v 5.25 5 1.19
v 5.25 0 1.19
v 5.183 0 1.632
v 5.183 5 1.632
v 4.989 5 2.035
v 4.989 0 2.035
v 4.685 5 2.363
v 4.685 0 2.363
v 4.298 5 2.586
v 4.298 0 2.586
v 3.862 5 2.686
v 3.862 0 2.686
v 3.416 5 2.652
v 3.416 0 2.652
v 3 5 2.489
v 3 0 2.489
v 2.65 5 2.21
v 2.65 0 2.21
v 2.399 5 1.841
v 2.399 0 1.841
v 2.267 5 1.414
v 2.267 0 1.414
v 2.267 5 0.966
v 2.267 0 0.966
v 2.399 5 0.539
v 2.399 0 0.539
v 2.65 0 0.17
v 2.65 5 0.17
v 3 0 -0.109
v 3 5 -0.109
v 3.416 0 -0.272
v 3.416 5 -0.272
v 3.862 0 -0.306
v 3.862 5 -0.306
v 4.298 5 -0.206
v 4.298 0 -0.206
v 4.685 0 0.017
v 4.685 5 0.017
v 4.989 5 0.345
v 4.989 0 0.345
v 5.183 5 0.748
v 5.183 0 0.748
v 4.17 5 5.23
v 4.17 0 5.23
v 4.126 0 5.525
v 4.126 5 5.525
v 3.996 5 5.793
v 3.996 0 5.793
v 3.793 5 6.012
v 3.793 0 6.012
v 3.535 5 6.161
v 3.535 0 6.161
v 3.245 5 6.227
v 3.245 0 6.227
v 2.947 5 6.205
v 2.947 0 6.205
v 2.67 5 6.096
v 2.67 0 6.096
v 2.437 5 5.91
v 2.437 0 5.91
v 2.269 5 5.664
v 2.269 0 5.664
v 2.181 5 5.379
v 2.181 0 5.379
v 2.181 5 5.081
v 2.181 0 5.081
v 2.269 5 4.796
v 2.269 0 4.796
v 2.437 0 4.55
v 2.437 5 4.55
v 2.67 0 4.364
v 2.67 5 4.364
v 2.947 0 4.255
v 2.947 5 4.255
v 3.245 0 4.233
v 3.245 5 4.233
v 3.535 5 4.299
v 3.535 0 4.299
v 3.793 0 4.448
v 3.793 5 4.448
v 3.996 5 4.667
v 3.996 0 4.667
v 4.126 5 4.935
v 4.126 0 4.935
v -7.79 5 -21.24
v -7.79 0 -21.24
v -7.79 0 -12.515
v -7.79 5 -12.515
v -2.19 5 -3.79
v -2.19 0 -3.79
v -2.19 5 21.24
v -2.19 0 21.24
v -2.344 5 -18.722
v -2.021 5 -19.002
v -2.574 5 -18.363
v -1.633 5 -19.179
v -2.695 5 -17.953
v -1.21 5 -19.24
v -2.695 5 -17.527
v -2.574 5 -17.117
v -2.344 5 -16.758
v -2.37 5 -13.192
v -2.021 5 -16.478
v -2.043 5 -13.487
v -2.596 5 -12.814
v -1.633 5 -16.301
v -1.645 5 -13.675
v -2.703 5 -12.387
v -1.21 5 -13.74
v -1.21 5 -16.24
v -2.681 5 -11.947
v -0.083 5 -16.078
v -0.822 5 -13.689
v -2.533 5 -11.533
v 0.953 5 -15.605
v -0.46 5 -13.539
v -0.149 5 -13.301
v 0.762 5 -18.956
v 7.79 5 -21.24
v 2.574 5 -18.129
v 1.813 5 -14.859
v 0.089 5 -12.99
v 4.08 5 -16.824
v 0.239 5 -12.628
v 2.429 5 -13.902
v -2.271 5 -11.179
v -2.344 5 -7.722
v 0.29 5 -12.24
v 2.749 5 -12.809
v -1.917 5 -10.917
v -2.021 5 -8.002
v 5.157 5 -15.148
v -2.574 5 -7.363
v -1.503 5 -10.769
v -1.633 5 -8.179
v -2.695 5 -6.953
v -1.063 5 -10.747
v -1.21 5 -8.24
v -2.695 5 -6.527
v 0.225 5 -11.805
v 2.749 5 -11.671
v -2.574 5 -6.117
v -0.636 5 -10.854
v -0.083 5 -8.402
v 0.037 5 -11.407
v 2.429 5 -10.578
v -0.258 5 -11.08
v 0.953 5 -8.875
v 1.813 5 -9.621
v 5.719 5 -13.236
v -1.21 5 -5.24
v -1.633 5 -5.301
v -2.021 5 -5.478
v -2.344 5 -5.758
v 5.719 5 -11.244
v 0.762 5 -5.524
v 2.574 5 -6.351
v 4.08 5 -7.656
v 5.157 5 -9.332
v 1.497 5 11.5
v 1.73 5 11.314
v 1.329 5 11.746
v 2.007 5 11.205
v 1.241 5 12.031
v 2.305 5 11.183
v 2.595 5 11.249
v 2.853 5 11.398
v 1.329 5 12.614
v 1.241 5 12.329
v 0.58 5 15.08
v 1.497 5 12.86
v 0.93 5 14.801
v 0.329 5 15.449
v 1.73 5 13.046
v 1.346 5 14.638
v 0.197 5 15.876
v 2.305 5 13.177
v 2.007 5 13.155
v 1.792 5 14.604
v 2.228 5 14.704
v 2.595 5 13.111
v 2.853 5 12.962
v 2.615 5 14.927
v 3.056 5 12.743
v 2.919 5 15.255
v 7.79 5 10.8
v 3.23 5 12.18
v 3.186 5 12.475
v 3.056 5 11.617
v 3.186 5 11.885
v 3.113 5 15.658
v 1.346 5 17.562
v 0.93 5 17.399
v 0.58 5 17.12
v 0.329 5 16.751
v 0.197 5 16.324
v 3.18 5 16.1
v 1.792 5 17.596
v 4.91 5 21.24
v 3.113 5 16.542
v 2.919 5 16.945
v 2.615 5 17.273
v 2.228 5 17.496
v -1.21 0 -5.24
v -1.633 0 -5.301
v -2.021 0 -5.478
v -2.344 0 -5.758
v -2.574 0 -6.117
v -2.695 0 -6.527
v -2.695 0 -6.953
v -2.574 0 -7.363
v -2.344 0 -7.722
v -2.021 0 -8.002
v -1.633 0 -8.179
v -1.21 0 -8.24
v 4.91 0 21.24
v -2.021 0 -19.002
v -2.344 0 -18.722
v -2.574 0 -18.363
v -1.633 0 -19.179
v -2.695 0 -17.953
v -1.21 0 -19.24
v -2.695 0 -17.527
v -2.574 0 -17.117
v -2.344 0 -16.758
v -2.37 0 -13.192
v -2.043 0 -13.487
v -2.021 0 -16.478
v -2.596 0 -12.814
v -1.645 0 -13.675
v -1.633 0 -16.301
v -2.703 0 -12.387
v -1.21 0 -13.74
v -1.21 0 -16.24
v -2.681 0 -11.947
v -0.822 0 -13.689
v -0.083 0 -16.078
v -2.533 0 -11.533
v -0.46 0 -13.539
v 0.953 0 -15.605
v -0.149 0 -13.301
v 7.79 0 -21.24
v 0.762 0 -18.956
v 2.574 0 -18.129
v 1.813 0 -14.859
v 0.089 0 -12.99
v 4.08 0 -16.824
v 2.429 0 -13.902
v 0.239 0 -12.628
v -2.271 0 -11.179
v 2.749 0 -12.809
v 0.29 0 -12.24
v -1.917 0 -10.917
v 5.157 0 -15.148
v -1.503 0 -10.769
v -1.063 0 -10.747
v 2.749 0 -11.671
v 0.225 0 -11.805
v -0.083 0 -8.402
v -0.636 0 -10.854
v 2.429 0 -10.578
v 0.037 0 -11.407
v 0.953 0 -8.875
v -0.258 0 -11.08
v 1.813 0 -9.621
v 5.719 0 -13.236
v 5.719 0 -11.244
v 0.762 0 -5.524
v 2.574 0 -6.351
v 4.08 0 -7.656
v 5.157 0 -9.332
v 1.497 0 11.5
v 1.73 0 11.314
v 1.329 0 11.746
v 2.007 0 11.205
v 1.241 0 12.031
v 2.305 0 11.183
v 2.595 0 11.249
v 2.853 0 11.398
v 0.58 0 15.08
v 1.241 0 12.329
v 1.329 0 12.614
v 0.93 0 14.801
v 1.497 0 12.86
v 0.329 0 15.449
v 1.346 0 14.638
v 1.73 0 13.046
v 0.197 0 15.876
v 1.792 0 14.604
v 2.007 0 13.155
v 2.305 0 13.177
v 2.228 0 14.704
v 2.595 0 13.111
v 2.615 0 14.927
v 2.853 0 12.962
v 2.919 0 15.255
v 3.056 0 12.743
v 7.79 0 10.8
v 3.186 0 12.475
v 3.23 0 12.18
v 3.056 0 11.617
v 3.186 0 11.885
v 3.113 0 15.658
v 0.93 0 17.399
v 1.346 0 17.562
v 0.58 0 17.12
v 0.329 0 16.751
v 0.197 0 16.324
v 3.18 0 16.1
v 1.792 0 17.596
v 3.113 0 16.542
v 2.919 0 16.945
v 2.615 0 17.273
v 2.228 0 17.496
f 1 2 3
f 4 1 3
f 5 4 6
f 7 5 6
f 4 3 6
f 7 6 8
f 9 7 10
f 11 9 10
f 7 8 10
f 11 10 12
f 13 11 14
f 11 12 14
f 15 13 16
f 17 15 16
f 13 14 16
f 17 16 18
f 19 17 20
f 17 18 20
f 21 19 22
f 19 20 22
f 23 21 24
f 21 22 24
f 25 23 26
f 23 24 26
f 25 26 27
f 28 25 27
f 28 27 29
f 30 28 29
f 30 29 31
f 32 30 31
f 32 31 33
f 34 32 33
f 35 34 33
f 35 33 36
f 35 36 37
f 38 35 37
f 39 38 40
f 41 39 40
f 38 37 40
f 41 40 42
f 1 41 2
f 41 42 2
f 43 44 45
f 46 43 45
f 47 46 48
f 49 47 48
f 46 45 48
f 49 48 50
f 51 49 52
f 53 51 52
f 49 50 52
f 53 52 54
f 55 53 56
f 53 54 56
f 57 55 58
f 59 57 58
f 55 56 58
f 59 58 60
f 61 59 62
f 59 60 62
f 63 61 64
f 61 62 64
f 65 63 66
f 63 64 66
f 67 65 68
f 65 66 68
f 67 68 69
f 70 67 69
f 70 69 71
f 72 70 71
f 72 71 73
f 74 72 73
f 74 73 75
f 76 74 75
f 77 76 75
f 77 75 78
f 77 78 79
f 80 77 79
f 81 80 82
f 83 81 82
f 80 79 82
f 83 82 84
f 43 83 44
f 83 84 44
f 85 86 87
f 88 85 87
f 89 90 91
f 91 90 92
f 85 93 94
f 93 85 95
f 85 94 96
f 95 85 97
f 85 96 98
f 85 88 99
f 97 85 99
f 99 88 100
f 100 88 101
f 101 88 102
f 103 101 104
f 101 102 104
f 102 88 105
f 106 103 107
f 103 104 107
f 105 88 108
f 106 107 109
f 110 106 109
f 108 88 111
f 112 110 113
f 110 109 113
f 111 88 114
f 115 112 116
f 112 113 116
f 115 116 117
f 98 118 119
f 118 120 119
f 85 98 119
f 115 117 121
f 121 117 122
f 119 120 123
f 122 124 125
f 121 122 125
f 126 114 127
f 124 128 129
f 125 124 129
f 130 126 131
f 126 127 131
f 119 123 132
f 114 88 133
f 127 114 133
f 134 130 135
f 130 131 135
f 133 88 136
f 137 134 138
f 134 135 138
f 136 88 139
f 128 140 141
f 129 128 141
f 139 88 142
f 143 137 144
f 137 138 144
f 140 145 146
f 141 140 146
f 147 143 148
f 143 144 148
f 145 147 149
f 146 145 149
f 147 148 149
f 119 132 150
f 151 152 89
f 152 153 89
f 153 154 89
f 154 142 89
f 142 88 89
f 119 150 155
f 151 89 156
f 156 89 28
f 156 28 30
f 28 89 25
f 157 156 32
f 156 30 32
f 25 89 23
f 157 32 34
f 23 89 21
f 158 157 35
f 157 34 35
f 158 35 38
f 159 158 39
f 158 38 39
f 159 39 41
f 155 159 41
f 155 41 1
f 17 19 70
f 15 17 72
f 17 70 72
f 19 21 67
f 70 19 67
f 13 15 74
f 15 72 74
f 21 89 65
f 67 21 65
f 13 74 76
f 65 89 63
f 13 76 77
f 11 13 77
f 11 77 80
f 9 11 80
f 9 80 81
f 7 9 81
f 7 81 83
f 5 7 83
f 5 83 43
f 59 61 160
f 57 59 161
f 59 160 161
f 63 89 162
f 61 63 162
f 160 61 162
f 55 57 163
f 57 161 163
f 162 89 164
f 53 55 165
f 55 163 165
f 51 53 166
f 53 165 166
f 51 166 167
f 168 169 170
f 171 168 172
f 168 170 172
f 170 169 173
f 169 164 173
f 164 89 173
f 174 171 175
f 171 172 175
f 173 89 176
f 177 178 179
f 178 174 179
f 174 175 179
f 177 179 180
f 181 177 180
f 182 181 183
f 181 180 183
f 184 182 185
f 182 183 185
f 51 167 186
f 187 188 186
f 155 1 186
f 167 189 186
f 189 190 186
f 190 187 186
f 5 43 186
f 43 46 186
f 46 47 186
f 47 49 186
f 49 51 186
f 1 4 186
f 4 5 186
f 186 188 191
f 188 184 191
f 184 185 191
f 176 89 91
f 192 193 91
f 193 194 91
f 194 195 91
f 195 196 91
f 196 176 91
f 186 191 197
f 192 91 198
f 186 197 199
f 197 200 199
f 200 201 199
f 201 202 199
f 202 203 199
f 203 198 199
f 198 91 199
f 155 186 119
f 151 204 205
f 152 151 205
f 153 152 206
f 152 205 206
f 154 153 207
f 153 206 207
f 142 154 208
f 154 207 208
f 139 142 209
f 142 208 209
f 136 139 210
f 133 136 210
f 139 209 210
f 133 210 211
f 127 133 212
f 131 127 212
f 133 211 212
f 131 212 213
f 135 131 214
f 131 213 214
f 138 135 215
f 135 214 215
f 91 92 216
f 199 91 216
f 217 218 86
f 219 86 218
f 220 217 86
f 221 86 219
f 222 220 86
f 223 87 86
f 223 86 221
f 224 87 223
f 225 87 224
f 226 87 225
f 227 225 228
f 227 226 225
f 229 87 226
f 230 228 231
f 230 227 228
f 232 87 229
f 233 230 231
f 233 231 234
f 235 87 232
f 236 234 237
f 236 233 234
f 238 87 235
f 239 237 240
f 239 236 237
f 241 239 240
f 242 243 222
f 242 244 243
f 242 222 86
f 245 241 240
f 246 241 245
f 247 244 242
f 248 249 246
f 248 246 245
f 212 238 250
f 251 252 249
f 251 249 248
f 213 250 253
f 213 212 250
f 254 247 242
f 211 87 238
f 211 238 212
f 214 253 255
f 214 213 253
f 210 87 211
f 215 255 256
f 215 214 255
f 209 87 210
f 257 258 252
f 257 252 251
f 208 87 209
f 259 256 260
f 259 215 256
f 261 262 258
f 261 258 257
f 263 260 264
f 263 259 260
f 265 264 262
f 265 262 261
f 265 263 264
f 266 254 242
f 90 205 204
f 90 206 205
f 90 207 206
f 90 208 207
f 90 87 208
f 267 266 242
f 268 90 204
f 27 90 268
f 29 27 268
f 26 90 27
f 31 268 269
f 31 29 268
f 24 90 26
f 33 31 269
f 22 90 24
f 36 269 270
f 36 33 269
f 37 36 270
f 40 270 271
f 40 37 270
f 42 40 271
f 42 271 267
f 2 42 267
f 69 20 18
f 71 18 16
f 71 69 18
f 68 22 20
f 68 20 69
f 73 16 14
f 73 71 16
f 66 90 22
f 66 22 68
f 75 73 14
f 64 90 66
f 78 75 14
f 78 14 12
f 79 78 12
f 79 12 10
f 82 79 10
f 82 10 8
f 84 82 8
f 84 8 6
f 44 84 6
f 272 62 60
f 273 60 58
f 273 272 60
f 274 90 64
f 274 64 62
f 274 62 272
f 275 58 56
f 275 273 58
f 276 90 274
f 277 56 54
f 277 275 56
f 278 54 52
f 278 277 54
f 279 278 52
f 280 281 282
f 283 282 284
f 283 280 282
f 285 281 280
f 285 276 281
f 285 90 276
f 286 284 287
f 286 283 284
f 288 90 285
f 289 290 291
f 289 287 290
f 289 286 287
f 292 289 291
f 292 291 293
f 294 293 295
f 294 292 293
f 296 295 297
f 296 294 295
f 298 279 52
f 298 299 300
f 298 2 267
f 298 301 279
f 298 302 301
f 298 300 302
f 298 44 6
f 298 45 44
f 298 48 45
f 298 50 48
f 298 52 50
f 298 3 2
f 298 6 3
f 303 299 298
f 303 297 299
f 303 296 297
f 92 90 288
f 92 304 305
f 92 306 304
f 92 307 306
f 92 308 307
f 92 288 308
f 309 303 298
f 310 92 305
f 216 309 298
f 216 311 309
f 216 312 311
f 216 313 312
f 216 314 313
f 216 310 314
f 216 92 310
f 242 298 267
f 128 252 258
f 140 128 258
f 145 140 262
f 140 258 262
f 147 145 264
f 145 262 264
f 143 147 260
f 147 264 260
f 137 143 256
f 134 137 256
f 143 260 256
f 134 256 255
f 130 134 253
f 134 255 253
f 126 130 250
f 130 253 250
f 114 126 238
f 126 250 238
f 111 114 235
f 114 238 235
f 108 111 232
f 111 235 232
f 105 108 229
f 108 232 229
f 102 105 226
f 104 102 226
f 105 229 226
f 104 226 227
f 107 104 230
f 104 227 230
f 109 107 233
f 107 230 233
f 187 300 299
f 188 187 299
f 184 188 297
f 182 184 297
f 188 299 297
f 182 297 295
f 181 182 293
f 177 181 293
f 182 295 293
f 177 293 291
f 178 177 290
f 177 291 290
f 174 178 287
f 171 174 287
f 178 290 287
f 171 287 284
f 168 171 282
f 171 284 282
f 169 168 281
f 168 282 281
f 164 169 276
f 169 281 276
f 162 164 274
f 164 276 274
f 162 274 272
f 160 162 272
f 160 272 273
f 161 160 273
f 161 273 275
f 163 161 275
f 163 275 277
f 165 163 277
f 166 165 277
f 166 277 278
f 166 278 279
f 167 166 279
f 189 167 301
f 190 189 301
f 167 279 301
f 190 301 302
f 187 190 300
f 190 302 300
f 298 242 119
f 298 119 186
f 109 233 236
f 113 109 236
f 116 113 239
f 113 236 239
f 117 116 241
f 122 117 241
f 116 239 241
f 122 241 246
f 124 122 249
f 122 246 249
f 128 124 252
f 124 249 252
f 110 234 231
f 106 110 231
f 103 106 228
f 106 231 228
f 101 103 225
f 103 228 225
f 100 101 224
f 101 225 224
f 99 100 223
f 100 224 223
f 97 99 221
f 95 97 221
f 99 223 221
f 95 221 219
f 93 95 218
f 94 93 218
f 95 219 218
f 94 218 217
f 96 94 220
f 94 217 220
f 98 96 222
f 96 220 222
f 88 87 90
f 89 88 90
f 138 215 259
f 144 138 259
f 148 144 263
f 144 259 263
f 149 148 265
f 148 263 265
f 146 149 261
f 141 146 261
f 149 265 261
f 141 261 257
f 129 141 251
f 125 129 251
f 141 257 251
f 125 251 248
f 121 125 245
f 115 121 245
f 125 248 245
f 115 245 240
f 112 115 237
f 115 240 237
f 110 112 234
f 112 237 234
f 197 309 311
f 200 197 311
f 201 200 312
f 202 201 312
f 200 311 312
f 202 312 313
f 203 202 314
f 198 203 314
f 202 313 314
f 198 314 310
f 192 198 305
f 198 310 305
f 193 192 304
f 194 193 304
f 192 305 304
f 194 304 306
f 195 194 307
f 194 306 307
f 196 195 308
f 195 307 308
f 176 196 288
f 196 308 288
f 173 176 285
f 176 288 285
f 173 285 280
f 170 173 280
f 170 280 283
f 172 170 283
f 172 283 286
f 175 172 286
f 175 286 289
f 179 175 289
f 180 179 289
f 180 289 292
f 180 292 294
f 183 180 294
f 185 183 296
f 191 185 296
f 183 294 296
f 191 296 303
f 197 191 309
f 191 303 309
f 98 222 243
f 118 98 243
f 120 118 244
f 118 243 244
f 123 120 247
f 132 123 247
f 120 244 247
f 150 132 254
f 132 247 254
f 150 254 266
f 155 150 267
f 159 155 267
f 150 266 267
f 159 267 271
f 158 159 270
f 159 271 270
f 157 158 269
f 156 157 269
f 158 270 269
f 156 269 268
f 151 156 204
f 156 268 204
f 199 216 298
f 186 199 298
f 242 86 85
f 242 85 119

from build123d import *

# Parameters (mm, degrees)
F0_W     = 15.58
F0_H     = 42.48
F1_DEPTH = 5
F3_DEPTH = 5
F5_DEPTH = 5
F6_R     = 1.5
F6_R_2   = 1
F7_DEPTH = 5
F9_DEPTH = 5


with BuildPart() as f1:
    # F0 (on Front) → F1 (new body)
    with BuildSketch(Plane.XZ):
        Rectangle(F0_W, F0_H)
    extrude(amount=-F1_DEPTH)

    # F2 (on face) → F3 (cut, through all)
    with BuildSketch(Plane.XZ):
        Polygon((4.91, 21.24), (7.79, 10.8), (7.79, 21.24), align=None)
    extrude(amount=-F3_DEPTH, mode=Mode.SUBTRACT)

    # F4 (on face) → F5 (cut, through all)
    with BuildSketch(Plane.XZ):
        Polygon((-2.19, -3.79), (-2.19, 21.24), (-7.79, 21.24), (-7.79, -12.515), align=None)
    extrude(amount=-F5_DEPTH, mode=Mode.SUBTRACT)

    # F6 (on face) → F7 (cut, through all)
    with BuildSketch(Plane.XZ):
        with Locations((3.75, 1.19)):
            Circle(F6_R)
        with Locations((3.17, 5.23)):
            Circle(F6_R_2)
        with Locations((2.23, 12.18)):
            Circle(F6_R_2)
        with Locations((1.68, 16.1)):
            Circle(F6_R)
    extrude(amount=-F7_DEPTH, mode=Mode.SUBTRACT)

    # F8 (on face) → F9 (cut, through all)
    with BuildSketch(Plane.XZ):
        with BuildLine():
            ThreePointArc((-1.21, -16.24), (-2.71, -17.74), (-1.21, -19.24))
            Line((-1.21, -19.24), (-1.21, -17.74))
            Line((-1.21, -17.74), (-1.21, -16.74))
            Line((-1.21, -16.74), (-1.21, -16.24))
        make_face()
        with BuildLine():
            Line((-1.21, -17.74), (-1.21, -19.24))
            ThreePointArc((-1.21, -19.24), (5.79, -12.24), (-1.21, -5.24))
            Line((-1.21, -5.24), (-1.21, -6.74))
            Line((-1.21, -6.74), (-1.21, -8.24))
            ThreePointArc((-1.21, -8.24), (2.79, -12.24), (-1.21, -16.24))
            Line((-1.21, -16.24), (-1.21, -16.74))
            Line((-1.21, -16.74), (-1.21, -17.74))
        make_face()
        with BuildLine():
            ThreePointArc((0.29, -12.24), (-2.27066, -11.17934), (-1.21, -13.74))
            ThreePointArc((-1.21, -13.74), (-0.14934, -13.30066), (0.29, -12.24))
        make_face()
        with BuildLine():
            Line((-1.21, -6.74), (-1.21, -5.24))
            ThreePointArc((-1.21, -5.24), (-2.71, -6.74), (-1.21, -8.24))
            Line((-1.21, -8.24), (-1.21, -6.74))
        make_face()
    extrude(amount=-F9_DEPTH, mode=Mode.SUBTRACT)


solid = f1.part
